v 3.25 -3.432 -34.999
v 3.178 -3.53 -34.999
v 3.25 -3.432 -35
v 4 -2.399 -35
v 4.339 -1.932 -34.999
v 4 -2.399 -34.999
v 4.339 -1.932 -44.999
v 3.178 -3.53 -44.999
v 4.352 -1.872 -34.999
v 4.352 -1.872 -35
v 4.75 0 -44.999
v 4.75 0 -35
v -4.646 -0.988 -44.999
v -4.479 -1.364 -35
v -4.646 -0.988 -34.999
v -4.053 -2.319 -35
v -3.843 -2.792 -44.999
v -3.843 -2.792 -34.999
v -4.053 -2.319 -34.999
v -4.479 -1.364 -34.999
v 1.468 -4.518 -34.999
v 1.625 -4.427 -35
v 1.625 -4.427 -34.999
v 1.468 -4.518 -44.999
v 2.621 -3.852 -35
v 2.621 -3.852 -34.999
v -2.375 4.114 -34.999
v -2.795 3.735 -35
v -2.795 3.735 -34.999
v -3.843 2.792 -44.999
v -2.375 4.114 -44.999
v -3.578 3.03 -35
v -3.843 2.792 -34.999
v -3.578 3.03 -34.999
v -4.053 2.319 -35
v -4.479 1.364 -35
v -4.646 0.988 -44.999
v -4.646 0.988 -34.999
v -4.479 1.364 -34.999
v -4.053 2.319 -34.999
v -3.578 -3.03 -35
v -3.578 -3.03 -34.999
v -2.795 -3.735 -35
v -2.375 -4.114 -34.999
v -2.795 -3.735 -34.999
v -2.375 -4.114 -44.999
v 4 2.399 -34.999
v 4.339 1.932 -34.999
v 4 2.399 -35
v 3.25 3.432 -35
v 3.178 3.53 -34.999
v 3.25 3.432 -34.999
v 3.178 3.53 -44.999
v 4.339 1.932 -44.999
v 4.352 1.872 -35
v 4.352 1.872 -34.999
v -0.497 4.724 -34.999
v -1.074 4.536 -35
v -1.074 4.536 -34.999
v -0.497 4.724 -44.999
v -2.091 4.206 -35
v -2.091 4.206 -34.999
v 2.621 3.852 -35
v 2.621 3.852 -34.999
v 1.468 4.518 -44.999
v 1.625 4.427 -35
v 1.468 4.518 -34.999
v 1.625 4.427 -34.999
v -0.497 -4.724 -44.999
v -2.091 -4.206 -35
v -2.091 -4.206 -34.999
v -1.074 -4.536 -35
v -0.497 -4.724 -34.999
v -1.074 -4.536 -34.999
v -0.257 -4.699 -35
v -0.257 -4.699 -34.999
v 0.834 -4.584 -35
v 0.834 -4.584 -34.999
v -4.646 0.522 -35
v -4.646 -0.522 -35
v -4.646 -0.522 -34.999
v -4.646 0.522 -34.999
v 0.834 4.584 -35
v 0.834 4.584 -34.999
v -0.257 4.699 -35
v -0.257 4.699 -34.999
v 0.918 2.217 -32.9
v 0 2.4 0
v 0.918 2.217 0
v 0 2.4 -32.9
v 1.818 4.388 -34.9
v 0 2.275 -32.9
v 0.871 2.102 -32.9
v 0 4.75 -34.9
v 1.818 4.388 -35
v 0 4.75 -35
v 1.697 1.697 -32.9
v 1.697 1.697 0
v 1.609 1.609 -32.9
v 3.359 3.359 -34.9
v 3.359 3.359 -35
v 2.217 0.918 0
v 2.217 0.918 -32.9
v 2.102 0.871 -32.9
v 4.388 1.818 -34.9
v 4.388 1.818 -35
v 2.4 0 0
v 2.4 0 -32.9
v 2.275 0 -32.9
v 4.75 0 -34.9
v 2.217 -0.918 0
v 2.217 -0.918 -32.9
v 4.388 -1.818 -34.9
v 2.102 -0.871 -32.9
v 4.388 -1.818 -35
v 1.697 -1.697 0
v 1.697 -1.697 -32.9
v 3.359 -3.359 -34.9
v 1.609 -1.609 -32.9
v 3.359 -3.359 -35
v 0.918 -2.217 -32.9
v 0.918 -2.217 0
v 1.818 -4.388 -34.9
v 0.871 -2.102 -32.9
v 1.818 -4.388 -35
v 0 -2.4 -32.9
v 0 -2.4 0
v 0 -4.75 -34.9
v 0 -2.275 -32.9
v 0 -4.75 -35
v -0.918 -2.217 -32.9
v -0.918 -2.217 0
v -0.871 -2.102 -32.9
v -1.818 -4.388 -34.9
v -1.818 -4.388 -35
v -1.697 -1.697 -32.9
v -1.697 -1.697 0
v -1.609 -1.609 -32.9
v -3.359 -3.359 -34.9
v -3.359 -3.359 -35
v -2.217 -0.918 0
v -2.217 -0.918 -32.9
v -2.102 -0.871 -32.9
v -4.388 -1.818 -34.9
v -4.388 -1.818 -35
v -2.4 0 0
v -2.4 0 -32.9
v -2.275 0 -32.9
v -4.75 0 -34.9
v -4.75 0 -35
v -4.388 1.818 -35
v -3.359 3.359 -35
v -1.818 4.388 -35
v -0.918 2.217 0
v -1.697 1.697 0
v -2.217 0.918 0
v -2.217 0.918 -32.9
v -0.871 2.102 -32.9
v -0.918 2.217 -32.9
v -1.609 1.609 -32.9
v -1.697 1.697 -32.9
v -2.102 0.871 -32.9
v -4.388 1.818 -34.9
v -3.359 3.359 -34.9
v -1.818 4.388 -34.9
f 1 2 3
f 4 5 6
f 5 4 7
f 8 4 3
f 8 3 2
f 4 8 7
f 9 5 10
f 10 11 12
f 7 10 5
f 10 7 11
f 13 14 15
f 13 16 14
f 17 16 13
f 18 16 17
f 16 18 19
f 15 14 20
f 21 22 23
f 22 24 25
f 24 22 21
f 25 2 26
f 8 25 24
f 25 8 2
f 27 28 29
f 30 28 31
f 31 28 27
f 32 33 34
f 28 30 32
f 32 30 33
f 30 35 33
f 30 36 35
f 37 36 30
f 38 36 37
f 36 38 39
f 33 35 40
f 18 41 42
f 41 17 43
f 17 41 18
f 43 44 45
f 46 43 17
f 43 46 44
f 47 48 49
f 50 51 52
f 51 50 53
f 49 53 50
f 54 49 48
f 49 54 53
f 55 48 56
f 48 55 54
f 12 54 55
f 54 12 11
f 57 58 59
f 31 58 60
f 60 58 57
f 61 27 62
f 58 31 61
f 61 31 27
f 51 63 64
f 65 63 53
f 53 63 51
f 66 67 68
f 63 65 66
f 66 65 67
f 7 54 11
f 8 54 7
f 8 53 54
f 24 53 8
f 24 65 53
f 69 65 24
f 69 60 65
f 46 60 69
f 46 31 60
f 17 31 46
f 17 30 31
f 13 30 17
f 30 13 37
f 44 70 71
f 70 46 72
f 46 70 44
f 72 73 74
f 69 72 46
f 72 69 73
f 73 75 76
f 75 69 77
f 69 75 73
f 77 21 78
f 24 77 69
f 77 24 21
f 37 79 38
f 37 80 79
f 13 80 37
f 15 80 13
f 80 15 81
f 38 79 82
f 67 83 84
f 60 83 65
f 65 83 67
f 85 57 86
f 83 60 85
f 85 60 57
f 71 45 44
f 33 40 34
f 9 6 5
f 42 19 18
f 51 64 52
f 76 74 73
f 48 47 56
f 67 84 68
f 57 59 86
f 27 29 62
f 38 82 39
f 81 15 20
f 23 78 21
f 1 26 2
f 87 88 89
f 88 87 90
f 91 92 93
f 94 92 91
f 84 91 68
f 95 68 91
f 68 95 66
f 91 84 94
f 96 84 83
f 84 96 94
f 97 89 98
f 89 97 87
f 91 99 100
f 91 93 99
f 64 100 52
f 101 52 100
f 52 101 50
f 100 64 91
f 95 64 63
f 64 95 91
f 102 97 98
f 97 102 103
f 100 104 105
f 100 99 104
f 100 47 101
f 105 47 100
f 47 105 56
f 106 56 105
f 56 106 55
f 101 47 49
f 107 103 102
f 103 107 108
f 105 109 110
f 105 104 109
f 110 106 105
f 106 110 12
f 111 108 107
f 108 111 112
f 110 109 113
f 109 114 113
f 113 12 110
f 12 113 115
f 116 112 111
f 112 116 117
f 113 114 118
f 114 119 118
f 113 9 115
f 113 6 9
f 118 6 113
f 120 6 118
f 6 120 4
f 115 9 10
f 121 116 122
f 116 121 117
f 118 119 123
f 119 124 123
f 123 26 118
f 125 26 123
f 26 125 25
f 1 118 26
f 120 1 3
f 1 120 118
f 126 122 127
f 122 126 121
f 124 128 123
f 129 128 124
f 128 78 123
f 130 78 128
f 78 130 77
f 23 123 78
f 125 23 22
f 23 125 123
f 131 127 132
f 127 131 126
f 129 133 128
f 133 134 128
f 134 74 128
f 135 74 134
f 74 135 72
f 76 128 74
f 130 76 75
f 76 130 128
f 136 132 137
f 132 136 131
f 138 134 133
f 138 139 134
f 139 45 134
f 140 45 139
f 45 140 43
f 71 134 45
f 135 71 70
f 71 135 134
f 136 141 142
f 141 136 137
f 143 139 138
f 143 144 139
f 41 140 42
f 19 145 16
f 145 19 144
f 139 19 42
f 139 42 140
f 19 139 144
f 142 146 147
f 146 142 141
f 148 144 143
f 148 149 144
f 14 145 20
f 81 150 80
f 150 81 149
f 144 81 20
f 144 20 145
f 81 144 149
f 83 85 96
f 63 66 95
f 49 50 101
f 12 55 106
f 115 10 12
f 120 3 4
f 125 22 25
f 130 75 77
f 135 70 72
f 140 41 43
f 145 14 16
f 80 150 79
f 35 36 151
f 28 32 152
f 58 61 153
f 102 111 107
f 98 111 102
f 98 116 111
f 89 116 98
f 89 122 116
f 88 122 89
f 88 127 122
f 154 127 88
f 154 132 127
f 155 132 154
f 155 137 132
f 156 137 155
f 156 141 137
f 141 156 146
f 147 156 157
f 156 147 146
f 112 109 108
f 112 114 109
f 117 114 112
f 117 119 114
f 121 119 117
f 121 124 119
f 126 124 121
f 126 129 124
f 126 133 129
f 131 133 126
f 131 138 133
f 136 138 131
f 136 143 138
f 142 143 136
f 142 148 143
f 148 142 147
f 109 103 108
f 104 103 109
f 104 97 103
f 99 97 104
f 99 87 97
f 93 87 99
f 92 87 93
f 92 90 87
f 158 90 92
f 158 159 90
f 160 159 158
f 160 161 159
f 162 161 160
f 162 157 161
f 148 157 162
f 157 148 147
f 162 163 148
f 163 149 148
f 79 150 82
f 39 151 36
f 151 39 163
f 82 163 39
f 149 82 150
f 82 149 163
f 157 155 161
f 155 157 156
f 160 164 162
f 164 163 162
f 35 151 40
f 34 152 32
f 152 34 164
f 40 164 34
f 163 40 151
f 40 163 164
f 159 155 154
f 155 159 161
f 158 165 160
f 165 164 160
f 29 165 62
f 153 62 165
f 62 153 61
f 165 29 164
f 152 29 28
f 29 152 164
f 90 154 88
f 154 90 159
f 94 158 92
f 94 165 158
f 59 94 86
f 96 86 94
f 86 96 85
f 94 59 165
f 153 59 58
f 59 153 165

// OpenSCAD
// Start: lazy_union
default_5_default_5();
// End: lazy_union

// Modules.

// 'PartMaterial undef-default - default 5.0'
module default_5_default_5() {
  // 'None : _combine_solids_and_holes'
  union() {
    // 'default : _combine_solids_and_holes'
    union() {
      // 'access_hole'
      multmatrix(m=[[1.0, 0.0, 0.0, 0.0], [0.0, -1.0, 0.0, 0.0], [0.0, 0.0, -1.0, -34.999], [0.0, 0.0, 0.0, 1.0]]) {
        // 'access_hole : _combine_solids_and_holes'
        union() {
          // 'access_hole'
          cylinder(h=10.0, r1=4.75, r2=4.75, center=false);
        }
      }
      // 'screw_hole'
      multmatrix(m=[[0.0, -1.0, 0.0, 0.0], [-1.0, 0.0, 0.0, 0.0], [0.0, 0.0, -1.0, 0.0], [0.0, 0.0, 0.0, 1.0]]) {
        // 'screw_hole : _combine_solids_and_holes'
        union() {
          // 'screw_hole'
          polyhedron(points=[[0.0, 0.0, 0.0], [-2.4, 0.0, 0.0], [-2.4, 0.0, 32.9], [-2.275, 0.0, 32.9], [-4.75, 0.0, 34.9], [-4.75, 0.0, 35.0], [0.0, 0.0, 35.0], [0.0, 0.0, 0.0], [-2.2173108780270883, -0.9184402376762154, 0.0], [-2.2173108780270883, -0.9184402376762154, 32.9], [-2.101825936463177, -0.8706048086305792, 32.9], [-4.388427779428612, -1.8177463037341766, 34.9], [-4.388427779428612, -1.8177463037341766, 35.0], [0.0, 0.0, 35.0], [0.0, 0.0, 0.0], [-1.697056274847714, -1.697056274847714, 0.0], [-1.697056274847714, -1.697056274847714, 32.9], [-1.6086679271993958, -1.6086679271993958, 32.9], [-3.3587572106361008, -3.3587572106361008, 34.9], [-3.3587572106361008, -3.3587572106361008, 35.0], [0.0, 0.0, 35.0], [0.0, 0.0, 0.0], [-0.9184402376762155, -2.2173108780270883, 0.0], [-0.9184402376762155, -2.2173108780270883, 32.9], [-0.8706048086305793, -2.101825936463177, 32.9], [-1.8177463037341768, -4.388427779428612, 34.9], [-1.8177463037341768, -4.388427779428612, 35.0], [0.0, 0.0, 35.0], [0.0, 0.0, 0.0], [0.0, -2.4, 0.0], [0.0, -2.4, 32.9], [0.0, -2.275, 32.9], [0.0, -4.75, 34.9], [0.0, -4.75, 35.0], [0.0, 0.0, 35.0], [0.0, 0.0, 0.0], [0.9184402376762153, -2.2173108780270883, 0.0], [0.9184402376762153, -2.2173108780270883, 32.9], [0.8706048086305791, -2.101825936463177, 32.9], [1.8177463037341761, -4.388427779428612, 34.9], [1.8177463037341761, -4.388427779428612, 35.0], [0.0, 0.0, 35.0], [0.0, 0.0, 0.0], [1.6970562748477138, -1.697056274847714, 0.0], [1.6970562748477138, -1.697056274847714, 32.9], [1.6086679271993953, -1.6086679271993958, 32.9], [3.3587572106361003, -3.3587572106361008, 34.9], [3.3587572106361003, -3.3587572106361008, 35.0], [0.0, 0.0, 35.0], [0.0, 0.0, 0.0], [2.2173108780270883, -0.9184402376762157, 0.0], [2.2173108780270883, -0.9184402376762157, 32.9], [2.101825936463177, -0.8706048086305794, 32.9], [4.388427779428612, -1.817746303734177, 34.9], [4.388427779428612, -1.817746303734177, 35.0], [0.0, 0.0, 35.0], [0.0, 0.0, 0.0], [2.4, 0.0, 0.0], [2.4, 0.0, 32.9], [2.275, 0.0, 32.9], [4.75, 0.0, 34.9], [4.75, 0.0, 35.0], [0.0, 0.0, 35.0], [0.0, 0.0, 0.0], [2.2173108780270883, 0.9184402376762152, 0.0], [2.2173108780270883, 0.9184402376762152, 32.9], [2.1018259364631775, 0.870604808630579, 32.9], [4.388427779428612, 1.817746303734176, 34.9], [4.388427779428612, 1.817746303734176, 35.0], [0.0, 0.0, 35.0], [0.0, 0.0, 0.0], [1.6970562748477145, 1.6970562748477138, 0.0], [1.6970562748477145, 1.6970562748477138, 32.9], [1.608667927199396, 1.6086679271993953, 32.9], [3.3587572106361017, 3.3587572106361003, 34.9], [3.3587572106361017, 3.3587572106361003, 35.0], [0.0, 0.0, 35.0], [0.0, 0.0, 0.0], [0.9184402376762167, 2.2173108780270874, 0.0], [0.9184402376762167, 2.2173108780270874, 32.9], [0.8706048086305804, 2.1018259364631766, 32.9], [1.817746303734179, 4.388427779428611, 34.9], [1.817746303734179, 4.388427779428611, 35.0], [0.0, 0.0, 35.0], [0.0, 0.0, 0.0], [0.0, 2.4, 0.0], [0.0, 2.4, 32.9], [0.0, 2.275, 32.9], [0.0, 4.75, 34.9], [0.0, 4.75, 35.0], [0.0, 0.0, 35.0], [0.0, 0.0, 0.0], [-0.918440237676216, 2.217310878027088, 0.0], [-0.918440237676216, 2.217310878027088, 32.9], [-0.8706048086305798, 2.101825936463177, 32.9], [-1.8177463037341774, 4.3884277794286115, 34.9], [-1.8177463037341774, 4.3884277794286115, 35.0], [0.0, 0.0, 35.0], [0.0, 0.0, 0.0], [-1.6970562748477136, 1.6970562748477145, 0.0], [-1.6970562748477136, 1.6970562748477145, 32.9], [-1.608667927199395, 1.608667927199396, 32.9], [-3.3587572106361, 3.3587572106361017, 34.9], [-3.3587572106361, 3.3587572106361017, 35.0], [0.0, 0.0, 35.0], [0.0, 0.0, 0.0], [-2.2173108780270874, 0.9184402376762169, 0.0], [-2.2173108780270874, 0.9184402376762169, 32.9], [-2.1018259364631766, 0.8706048086305807, 32.9], [-4.388427779428611, 1.8177463037341794, 34.9], [-4.388427779428611, 1.8177463037341794, 35.0], [0.0, 0.0, 35.0], [0.0, 0.0, 0.0], [-2.4, 0.0, 0.0], [-2.4, 0.0, 32.9], [-2.275, 0.0, 32.9], [-4.75, 0.0, 34.9], [-4.75, 0.0, 35.0], [0.0, 0.0, 35.0]], faces=[[0, 7, 8, 1], [1, 8, 9, 2], [2, 9, 10, 3], [3, 10, 11, 4], [4, 11, 12, 5], [5, 12, 13, 6], [6, 13, 7, 0], [7, 14, 15, 8], [8, 15, 16, 9], [9, 16, 17, 10], [10, 17, 18, 11], [11, 18, 19, 12], [12, 19, 20, 13], [13, 20, 14, 7], [14, 21, 22, 15], [15, 22, 23, 16], [16, 23, 24, 17], [17, 24, 25, 18], [18, 25, 26, 19], [19, 26, 27, 20], [20, 27, 21, 14], [21, 28, 29, 22], [22, 29, 30, 23], [23, 30, 31, 24], [24, 31, 32, 25], [25, 32, 33, 26], [26, 33, 34, 27], [27, 34, 28, 21], [28, 35, 36, 29], [29, 36, 37, 30], [30, 37, 38, 31], [31, 38, 39, 32], [32, 39, 40, 33], [33, 40, 41, 34], [34, 41, 35, 28], [35, 42, 43, 36], [36, 43, 44, 37], [37, 44, 45, 38], [38, 45, 46, 39], [39, 46, 47, 40], [40, 47, 48, 41], [41, 48, 42, 35], [42, 49, 50, 43], [43, 50, 51, 44], [44, 51, 52, 45], [45, 52, 53, 46], [46, 53, 54, 47], [47, 54, 55, 48], [48, 55, 49, 42], [49, 56, 57, 50], [50, 57, 58, 51], [51, 58, 59, 52], [52, 59, 60, 53], [53, 60, 61, 54], [54, 61, 62, 55], [55, 62, 56, 49], [56, 63, 64, 57], [57, 64, 65, 58], [58, 65, 66, 59], [59, 66, 67, 60], [60, 67, 68, 61], [61, 68, 69, 62], [62, 69, 63, 56], [63, 70, 71, 64], [64, 71, 72, 65], [65, 72, 73, 66], [66, 73, 74, 67], [67, 74, 75, 68], [68, 75, 76, 69], [69, 76, 70, 63], [70, 77, 78, 71], [71, 78, 79, 72], [72, 79, 80, 73], [73, 80, 81, 74], [74, 81, 82, 75], [75, 82, 83, 76], [76, 83, 77, 70], [77, 84, 85, 78], [78, 85, 86, 79], [79, 86, 87, 80], [80, 87, 88, 81], [81, 88, 89, 82], [82, 89, 90, 83], [83, 90, 84, 77], [84, 91, 92, 85], [85, 92, 93, 86], [86, 93, 94, 87], [87, 94, 95, 88], [88, 95, 96, 89], [89, 96, 97, 90], [90, 97, 91, 84], [91, 98, 99, 92], [92, 99, 100, 93], [93, 100, 101, 94], [94, 101, 102, 95], [95, 102, 103, 96], [96, 103, 104, 97], [97, 104, 98, 91], [98, 105, 106, 99], [99, 106, 107, 100], [100, 107, 108, 101], [101, 108, 109, 102], [102, 109, 110, 103], [103, 110, 111, 104], [104, 111, 105, 98], [105, 112, 113, 106], [106, 113, 114, 107], [107, 114, 115, 108], [108, 115, 116, 109], [109, 116, 117, 110], [110, 117, 118, 111], [111, 118, 112, 105], [112, 0, 1, 113], [113, 1, 2, 114], [114, 2, 3, 115], [115, 3, 4, 116], [116, 4, 5, 117], [117, 5, 6, 118], [118, 6, 0, 112]], convexity=10);
        }
      }
    }
  }
} // end module default_5_default_5
